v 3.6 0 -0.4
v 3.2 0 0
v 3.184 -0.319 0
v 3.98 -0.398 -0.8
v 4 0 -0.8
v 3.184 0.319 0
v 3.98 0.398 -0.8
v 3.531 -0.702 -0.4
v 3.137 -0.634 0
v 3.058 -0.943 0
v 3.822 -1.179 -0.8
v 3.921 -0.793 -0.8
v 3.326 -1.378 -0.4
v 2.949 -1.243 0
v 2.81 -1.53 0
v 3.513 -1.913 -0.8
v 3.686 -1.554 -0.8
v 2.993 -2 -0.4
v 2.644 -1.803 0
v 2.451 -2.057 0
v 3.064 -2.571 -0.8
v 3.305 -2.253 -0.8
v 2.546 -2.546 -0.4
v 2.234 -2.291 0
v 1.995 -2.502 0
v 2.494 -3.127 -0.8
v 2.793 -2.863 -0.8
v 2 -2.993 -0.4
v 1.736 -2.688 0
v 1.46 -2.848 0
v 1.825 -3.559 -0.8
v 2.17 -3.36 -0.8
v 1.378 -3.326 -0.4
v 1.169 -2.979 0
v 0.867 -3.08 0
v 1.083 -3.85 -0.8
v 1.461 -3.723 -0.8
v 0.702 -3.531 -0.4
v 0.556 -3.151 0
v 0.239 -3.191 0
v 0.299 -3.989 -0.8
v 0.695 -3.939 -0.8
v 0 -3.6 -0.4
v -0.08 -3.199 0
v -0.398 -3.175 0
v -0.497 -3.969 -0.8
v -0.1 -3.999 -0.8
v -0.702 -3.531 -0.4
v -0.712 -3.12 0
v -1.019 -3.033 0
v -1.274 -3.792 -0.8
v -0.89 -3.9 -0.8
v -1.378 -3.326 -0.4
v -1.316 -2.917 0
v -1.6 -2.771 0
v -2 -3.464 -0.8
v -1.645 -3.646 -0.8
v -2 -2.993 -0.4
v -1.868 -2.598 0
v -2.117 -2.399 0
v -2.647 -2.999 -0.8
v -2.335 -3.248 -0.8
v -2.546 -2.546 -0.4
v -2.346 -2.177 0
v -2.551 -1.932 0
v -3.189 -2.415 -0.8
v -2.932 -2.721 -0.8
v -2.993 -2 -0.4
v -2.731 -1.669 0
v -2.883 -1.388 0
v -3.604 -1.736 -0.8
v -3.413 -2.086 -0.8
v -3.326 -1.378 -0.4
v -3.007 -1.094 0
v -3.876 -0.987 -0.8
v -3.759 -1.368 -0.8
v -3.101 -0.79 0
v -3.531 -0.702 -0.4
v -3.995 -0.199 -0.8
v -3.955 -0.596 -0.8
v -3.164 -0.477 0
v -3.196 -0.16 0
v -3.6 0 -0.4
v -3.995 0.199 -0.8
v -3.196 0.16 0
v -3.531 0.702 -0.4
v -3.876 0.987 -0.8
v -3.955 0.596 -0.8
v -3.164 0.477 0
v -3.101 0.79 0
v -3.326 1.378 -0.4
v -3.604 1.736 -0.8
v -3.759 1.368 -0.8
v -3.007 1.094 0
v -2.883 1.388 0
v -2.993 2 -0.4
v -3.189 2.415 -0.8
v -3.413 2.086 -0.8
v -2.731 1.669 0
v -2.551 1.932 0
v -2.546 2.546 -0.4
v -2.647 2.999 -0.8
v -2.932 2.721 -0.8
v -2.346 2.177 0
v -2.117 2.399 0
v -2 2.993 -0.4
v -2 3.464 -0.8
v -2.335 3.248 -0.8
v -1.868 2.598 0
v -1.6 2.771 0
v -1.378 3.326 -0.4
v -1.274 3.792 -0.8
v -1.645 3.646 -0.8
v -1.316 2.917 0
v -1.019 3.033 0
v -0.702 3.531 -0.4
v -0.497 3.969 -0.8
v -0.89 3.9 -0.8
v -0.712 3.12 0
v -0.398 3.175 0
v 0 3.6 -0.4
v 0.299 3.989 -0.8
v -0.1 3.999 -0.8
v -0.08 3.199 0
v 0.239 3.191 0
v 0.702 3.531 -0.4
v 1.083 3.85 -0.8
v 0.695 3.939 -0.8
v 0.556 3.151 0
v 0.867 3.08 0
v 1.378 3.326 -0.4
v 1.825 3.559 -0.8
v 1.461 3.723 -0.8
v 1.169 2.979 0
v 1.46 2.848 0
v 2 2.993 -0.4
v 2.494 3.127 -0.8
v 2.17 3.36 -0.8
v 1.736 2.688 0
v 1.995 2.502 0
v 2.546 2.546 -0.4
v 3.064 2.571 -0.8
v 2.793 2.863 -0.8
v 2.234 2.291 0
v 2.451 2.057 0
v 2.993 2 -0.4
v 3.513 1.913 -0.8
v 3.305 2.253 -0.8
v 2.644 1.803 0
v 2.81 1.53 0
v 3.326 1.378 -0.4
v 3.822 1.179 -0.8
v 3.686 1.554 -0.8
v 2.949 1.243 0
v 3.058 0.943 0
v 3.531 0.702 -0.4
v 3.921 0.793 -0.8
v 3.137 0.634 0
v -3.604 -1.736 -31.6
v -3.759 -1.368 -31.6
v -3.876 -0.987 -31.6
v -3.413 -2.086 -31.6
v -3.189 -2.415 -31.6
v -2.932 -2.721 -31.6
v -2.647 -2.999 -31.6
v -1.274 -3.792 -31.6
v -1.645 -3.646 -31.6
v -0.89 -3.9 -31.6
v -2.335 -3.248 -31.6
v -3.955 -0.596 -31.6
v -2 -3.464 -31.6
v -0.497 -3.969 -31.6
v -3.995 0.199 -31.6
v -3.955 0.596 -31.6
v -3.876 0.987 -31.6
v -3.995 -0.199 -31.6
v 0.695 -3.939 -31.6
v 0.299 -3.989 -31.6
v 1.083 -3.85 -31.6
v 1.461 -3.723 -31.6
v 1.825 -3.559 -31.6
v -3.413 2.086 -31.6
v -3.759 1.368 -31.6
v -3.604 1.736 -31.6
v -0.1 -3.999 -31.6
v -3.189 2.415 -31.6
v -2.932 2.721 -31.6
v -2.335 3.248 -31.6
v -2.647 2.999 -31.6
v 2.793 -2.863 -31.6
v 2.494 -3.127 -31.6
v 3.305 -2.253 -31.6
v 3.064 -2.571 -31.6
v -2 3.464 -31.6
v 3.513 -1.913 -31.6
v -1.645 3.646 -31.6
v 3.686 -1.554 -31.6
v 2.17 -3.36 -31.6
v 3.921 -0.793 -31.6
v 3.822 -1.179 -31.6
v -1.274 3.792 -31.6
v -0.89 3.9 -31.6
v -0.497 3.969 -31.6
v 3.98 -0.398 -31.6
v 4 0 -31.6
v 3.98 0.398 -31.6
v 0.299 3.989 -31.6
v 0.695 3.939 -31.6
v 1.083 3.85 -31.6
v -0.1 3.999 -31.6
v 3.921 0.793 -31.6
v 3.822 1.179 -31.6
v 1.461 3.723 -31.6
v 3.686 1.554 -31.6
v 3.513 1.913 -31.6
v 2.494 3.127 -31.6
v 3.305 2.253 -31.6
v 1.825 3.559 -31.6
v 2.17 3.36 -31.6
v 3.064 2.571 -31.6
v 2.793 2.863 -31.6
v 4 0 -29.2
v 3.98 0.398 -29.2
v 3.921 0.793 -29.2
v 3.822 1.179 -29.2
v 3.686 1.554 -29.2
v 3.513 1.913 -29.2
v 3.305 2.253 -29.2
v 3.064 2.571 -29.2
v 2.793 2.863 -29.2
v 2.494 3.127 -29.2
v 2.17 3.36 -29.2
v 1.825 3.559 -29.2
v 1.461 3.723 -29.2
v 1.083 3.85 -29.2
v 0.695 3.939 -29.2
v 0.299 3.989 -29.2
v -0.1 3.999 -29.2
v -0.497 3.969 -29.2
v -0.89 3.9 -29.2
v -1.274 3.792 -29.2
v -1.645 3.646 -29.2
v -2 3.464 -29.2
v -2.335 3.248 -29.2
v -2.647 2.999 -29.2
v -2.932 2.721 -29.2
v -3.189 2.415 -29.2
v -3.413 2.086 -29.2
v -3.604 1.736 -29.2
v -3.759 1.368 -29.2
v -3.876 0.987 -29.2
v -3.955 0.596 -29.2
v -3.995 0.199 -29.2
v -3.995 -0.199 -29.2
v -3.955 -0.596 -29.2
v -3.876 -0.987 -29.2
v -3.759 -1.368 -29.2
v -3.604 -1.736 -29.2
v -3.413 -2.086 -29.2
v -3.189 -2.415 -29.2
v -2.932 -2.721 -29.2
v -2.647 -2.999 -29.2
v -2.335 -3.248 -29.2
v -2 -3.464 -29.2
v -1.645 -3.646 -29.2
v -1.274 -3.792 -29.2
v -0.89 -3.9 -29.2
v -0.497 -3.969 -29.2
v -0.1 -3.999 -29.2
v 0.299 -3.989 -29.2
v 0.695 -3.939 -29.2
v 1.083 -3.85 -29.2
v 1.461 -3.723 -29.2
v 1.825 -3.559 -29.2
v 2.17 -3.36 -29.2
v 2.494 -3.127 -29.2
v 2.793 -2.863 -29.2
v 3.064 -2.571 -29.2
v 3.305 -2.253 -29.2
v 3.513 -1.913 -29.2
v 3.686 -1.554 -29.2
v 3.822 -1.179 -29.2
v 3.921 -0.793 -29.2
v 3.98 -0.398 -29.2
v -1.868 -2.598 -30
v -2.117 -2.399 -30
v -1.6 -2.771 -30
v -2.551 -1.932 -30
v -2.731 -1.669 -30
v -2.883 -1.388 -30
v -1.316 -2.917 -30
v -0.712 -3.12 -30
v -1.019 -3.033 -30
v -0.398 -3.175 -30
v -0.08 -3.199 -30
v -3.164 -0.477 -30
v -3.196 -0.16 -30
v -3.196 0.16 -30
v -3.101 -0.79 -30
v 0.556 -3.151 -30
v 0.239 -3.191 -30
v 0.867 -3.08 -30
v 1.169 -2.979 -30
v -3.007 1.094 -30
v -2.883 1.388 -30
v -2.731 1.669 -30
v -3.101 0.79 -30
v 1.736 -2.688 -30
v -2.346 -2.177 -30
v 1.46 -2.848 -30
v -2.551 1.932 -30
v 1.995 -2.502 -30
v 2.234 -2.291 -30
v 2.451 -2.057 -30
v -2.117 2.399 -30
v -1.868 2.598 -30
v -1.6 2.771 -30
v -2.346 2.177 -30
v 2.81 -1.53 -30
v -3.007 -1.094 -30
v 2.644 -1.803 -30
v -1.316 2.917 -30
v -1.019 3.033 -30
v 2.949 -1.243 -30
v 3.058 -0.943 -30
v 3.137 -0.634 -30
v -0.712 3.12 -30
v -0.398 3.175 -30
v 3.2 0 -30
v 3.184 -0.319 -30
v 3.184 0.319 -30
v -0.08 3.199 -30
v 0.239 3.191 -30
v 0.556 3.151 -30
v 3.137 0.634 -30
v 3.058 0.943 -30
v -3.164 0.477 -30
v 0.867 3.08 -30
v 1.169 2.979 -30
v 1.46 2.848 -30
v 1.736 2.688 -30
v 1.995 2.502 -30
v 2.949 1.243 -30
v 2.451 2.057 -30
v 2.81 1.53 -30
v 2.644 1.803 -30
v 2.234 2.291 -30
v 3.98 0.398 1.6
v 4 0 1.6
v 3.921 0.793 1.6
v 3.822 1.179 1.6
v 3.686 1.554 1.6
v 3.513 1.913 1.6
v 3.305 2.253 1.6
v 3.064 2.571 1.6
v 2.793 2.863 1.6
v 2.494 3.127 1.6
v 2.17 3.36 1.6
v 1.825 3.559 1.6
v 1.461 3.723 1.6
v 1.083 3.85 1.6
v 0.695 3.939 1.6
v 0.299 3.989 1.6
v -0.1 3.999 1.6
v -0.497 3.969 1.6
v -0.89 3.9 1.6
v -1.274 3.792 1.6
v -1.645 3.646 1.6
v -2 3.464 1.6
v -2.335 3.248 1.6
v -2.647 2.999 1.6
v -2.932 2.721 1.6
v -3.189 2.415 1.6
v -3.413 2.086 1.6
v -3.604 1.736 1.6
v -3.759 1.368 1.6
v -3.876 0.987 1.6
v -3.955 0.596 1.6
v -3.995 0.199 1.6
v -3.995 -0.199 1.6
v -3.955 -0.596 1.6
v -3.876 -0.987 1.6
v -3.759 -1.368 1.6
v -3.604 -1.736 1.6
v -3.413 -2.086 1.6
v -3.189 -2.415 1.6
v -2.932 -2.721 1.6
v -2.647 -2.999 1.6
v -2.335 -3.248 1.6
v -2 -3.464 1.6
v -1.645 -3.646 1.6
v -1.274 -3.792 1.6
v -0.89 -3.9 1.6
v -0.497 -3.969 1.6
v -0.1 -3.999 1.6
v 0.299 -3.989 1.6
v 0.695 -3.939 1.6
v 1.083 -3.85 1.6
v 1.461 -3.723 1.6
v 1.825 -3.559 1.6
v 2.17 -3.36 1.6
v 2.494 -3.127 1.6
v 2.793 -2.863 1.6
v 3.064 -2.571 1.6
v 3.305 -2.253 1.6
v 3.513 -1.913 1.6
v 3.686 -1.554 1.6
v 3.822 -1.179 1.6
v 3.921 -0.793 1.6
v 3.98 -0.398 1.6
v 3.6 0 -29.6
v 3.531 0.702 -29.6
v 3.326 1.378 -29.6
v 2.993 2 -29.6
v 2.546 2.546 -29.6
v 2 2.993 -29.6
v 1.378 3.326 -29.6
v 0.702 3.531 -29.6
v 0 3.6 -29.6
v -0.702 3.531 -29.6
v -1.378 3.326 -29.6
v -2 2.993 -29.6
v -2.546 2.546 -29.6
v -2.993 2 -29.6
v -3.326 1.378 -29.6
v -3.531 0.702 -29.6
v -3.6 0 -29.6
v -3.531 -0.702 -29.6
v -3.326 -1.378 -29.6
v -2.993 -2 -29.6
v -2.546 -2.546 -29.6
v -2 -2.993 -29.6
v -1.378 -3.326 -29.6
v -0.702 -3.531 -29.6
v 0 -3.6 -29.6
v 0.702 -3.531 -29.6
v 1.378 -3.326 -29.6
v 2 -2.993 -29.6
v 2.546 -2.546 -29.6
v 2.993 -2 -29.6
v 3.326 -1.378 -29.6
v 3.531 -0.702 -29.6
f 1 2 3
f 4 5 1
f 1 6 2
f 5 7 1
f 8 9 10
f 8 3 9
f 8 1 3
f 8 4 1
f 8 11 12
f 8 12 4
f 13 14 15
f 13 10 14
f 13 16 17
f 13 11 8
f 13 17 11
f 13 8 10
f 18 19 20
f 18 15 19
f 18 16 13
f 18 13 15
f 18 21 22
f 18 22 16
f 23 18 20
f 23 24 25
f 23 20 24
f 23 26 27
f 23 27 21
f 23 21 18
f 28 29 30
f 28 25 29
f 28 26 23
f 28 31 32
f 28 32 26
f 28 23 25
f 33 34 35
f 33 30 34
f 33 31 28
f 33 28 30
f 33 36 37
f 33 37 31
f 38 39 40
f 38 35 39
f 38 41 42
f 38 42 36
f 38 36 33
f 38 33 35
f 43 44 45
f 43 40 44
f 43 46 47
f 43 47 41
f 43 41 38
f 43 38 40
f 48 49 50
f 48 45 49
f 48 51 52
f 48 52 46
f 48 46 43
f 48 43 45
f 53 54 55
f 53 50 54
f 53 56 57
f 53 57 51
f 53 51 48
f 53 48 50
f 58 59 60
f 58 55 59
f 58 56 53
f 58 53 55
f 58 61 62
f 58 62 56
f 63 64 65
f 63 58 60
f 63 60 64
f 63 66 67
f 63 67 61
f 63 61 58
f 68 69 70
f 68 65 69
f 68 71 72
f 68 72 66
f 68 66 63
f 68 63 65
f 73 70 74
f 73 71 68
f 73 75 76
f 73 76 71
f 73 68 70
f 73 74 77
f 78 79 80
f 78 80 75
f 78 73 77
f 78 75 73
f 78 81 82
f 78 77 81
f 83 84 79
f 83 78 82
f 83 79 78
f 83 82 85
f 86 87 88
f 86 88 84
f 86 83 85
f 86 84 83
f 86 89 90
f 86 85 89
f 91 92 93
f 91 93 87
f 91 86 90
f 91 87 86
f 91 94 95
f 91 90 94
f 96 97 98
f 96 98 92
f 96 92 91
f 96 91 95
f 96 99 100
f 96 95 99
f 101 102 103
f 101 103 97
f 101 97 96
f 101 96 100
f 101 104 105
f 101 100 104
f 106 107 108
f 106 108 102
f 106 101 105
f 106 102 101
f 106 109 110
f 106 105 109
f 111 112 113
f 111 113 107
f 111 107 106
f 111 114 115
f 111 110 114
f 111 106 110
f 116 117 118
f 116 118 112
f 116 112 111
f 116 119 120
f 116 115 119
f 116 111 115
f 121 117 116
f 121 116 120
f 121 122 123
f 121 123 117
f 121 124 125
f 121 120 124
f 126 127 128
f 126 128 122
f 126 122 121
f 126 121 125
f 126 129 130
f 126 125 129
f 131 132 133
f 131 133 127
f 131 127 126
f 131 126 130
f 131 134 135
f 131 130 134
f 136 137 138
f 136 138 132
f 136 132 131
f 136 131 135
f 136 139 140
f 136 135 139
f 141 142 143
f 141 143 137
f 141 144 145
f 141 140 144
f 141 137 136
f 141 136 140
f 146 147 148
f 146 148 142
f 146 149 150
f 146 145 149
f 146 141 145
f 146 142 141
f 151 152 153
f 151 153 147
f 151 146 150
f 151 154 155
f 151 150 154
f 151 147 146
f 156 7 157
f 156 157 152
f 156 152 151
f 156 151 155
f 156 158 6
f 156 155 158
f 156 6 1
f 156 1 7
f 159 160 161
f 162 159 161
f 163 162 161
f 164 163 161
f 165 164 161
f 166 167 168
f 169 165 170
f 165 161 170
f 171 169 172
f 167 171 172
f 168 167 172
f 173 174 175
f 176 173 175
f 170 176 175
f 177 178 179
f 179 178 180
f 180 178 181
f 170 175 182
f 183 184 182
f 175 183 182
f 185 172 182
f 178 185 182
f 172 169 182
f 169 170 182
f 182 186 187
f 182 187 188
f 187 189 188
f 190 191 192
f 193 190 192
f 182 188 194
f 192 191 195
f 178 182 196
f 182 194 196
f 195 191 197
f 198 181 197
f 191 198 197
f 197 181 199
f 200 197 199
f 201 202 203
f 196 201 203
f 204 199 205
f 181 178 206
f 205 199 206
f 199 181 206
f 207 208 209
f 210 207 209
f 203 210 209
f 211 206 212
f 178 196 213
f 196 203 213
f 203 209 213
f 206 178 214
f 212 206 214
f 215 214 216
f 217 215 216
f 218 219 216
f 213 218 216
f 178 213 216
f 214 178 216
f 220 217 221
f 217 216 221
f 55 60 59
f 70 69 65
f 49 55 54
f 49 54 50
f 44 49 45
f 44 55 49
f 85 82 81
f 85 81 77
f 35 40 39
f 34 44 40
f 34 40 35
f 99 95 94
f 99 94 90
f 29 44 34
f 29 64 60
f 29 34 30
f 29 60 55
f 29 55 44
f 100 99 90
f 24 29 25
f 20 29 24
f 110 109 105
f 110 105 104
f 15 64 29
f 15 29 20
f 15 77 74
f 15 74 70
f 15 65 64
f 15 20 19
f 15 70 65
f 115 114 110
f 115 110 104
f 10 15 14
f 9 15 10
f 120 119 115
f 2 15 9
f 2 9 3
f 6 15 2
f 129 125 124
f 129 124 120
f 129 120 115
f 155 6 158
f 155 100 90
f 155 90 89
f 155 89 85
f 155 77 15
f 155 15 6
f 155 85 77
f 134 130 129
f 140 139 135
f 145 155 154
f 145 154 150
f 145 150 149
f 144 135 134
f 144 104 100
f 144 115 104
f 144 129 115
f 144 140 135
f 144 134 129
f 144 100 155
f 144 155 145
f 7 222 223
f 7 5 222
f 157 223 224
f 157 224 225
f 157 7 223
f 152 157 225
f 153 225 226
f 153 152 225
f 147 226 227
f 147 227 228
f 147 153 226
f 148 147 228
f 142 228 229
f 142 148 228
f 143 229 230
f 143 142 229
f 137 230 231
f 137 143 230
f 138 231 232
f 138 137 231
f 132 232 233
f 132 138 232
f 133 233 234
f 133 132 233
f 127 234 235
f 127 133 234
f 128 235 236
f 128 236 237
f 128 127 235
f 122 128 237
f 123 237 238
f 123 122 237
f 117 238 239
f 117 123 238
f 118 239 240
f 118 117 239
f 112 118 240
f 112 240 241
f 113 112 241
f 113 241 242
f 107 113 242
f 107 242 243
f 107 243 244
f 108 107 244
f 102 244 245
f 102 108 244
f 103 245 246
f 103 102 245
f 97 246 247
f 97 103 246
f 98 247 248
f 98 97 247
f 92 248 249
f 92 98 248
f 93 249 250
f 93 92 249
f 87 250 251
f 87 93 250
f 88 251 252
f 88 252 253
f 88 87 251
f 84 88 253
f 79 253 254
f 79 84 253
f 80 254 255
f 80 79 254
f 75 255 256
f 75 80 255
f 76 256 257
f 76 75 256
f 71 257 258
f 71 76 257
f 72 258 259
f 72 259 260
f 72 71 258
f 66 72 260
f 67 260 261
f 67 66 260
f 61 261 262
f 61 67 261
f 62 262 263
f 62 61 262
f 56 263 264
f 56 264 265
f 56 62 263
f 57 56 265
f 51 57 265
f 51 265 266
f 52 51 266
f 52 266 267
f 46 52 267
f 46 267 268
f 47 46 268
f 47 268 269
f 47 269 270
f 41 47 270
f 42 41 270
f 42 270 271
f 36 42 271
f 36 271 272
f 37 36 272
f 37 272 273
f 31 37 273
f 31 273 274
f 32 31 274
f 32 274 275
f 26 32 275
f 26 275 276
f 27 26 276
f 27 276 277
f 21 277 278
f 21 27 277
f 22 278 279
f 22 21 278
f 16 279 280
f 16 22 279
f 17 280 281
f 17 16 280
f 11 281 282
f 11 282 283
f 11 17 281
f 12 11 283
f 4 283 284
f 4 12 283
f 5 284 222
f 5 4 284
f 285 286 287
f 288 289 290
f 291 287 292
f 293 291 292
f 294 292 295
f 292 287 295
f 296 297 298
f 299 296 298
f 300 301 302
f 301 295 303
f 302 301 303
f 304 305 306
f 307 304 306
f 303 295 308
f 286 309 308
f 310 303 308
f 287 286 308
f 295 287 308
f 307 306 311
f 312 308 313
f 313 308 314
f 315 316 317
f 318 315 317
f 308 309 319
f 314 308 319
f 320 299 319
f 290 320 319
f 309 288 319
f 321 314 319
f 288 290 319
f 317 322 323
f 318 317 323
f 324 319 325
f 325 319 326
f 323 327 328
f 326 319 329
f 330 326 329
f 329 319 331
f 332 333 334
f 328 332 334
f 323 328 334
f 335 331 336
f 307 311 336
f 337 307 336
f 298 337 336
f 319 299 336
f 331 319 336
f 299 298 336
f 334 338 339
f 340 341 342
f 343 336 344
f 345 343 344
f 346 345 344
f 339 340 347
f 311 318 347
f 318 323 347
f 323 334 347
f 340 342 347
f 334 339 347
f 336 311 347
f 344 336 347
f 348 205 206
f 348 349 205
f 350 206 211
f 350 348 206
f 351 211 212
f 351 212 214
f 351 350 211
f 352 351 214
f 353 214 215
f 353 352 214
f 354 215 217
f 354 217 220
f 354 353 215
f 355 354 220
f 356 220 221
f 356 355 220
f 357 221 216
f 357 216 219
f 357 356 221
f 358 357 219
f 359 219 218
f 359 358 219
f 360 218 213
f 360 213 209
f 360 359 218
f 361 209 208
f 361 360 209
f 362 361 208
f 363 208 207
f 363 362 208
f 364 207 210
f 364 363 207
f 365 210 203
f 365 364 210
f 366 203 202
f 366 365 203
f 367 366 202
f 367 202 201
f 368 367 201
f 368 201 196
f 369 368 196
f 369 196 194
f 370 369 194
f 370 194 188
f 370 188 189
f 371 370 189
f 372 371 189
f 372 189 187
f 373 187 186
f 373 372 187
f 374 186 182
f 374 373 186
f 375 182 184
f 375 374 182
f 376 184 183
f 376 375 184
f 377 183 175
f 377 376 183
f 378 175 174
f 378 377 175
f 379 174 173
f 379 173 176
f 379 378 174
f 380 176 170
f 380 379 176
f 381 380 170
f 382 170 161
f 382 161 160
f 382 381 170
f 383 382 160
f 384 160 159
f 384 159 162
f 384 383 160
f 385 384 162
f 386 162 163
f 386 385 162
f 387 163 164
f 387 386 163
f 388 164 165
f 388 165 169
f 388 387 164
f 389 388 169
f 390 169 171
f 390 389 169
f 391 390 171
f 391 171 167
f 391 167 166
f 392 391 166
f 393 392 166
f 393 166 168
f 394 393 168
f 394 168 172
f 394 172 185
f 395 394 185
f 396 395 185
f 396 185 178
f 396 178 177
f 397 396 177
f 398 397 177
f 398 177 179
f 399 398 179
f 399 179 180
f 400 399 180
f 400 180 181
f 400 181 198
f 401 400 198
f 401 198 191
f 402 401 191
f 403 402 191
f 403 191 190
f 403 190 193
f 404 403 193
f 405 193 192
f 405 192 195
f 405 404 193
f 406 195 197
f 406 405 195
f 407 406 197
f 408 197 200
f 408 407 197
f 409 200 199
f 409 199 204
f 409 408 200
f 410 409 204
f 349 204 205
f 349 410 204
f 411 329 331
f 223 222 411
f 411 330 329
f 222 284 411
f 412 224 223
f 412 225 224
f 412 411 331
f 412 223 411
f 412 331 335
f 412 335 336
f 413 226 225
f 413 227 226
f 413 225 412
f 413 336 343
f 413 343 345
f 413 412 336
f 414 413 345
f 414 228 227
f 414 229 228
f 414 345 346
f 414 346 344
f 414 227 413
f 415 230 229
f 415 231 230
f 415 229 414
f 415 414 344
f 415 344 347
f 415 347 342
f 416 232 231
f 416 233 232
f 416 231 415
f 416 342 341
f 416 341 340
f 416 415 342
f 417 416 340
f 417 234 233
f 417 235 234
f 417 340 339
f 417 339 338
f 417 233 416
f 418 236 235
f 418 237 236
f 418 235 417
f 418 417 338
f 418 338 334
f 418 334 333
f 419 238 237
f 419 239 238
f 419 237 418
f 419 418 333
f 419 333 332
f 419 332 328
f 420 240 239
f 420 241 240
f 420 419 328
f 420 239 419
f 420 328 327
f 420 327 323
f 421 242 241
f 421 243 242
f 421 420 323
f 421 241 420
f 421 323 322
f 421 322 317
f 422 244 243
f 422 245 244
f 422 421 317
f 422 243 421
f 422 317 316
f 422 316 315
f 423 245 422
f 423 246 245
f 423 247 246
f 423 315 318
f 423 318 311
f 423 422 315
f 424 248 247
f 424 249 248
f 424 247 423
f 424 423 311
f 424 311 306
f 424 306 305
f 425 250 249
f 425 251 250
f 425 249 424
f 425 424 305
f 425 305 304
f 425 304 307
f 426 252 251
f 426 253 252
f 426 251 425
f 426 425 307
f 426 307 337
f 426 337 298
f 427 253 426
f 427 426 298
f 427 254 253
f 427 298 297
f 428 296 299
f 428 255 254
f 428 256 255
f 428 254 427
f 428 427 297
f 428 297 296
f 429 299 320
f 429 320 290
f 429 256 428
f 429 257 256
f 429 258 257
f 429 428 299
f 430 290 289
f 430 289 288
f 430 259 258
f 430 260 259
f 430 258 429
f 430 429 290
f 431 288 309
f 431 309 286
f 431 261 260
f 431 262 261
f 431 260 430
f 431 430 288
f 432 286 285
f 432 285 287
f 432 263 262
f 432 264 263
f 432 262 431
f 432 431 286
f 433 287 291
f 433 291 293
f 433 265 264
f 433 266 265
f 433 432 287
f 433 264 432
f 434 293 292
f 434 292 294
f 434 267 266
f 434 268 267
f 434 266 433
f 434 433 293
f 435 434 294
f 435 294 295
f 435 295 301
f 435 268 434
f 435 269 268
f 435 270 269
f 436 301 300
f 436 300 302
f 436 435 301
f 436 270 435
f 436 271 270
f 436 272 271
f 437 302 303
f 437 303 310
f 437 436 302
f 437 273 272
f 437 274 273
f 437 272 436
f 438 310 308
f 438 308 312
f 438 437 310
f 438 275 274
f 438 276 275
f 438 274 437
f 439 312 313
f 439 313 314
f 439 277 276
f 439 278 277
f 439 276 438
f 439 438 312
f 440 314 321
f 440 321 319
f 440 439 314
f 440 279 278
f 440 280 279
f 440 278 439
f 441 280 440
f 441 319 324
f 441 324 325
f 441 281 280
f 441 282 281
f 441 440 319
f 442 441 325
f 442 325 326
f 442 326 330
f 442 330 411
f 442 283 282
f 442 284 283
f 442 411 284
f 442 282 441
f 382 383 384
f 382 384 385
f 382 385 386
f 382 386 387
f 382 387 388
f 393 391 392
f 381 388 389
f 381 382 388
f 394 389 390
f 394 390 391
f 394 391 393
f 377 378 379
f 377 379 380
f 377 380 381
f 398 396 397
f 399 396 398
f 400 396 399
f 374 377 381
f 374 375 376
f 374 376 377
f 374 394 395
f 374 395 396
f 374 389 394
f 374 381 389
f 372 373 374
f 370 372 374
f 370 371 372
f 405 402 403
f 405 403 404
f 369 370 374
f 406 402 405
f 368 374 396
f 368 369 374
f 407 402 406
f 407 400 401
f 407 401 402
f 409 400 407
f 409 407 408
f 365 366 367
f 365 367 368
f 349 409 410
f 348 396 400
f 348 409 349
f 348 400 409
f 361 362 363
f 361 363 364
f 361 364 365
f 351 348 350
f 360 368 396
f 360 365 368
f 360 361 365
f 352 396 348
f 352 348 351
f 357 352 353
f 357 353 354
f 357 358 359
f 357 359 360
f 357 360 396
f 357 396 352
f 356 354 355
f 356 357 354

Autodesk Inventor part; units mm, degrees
ref_plane "YZ Plane" through (0, 0, 0) normal (1, 0, 0) x (0, 1, 0)
ref_plane "XZ Plane" through (0, 0, 0) normal (0, 1, 0) x (-1, 0, 0)
sketch "Sketch1" plane through (0, 0, 0) normal (0, 0, 1) x (1, 0, 0)
  circle A0 centre (0, 0) radius 4
  dimension "Diam" = 8
extrude "Extrusion1" add sketch "Sketch1" against normal blind 30
chamfer "Chamfer1" distance 0.8 angle 45 2 edges at (-4, 0, 0) (-4, 0, -30)
ref_plane "Work Plane1" through (0, 0, 1.6) normal (0, 0, 1) x (1, 0, 0)
sketch "Sketch2" plane through (0, 0, 1.6) normal (0, 0, 1) x (1, 0, 0)
  circle A0 centre (0, 0) radius 4 projected
  circle A1 centre (0, 0) radius 4 projected
extrude "Extrusion2" add sketch "Sketch2" against normal blind 33.2 separate body
equation "\"d3\" = 0.1 * Diam"
equation "\"d7\" = L + 2 * Offset"
equation "\"Offset\" = 1.6"
equation "\"d6\" = Offset"
equation "\"L\" = 30"
properties part number "MS Dowel" material "Wood (Birch)"
